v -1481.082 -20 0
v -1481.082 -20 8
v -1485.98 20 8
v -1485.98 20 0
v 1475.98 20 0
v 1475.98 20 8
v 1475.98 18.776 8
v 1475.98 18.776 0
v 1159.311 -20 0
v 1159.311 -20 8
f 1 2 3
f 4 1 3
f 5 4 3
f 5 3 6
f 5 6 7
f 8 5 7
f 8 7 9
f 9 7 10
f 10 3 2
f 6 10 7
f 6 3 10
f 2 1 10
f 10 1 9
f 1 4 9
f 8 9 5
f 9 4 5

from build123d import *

# Parameters (mm, degrees)
F0_W     = 2971.96
F0_H     = 40
F1_DEPTH = 8
F3_DEPTH = 100
F5_DEPTH = 25
F7_DEPTH = 25


with BuildPart() as f1:
    # F0 (on Top) → F1 (new body)
    with BuildSketch(Plane.XY):
        Rectangle(F0_W, F0_H)
    extrude(amount=F1_DEPTH)

    # F2 (on face) → F3 (cut)
    with BuildSketch(Plane.XY.offset(8)):
        Polygon((1485.98, -20), (1485.98, 20), (1159.31062, -20), align=None)
    extrude(amount=-F3_DEPTH, mode=Mode.SUBTRACT)

    # F4 (on face) → F5 (cut)
    with BuildSketch(Plane.XY.offset(8)):
        Polygon((1475.98, 18.77552), (1485.98, 20), (1475.98, 20), align=None)
    extrude(amount=-F5_DEPTH, mode=Mode.SUBTRACT)

    # F6 (on face) → F7 (cut)
    with BuildSketch(Plane.XY.offset(8)):
        Polygon((-1481.082081, -20), (-1485.98, 20), (-1485.98, -20), align=None)
    extrude(amount=-F7_DEPTH, mode=Mode.SUBTRACT)


solid = f1.part
